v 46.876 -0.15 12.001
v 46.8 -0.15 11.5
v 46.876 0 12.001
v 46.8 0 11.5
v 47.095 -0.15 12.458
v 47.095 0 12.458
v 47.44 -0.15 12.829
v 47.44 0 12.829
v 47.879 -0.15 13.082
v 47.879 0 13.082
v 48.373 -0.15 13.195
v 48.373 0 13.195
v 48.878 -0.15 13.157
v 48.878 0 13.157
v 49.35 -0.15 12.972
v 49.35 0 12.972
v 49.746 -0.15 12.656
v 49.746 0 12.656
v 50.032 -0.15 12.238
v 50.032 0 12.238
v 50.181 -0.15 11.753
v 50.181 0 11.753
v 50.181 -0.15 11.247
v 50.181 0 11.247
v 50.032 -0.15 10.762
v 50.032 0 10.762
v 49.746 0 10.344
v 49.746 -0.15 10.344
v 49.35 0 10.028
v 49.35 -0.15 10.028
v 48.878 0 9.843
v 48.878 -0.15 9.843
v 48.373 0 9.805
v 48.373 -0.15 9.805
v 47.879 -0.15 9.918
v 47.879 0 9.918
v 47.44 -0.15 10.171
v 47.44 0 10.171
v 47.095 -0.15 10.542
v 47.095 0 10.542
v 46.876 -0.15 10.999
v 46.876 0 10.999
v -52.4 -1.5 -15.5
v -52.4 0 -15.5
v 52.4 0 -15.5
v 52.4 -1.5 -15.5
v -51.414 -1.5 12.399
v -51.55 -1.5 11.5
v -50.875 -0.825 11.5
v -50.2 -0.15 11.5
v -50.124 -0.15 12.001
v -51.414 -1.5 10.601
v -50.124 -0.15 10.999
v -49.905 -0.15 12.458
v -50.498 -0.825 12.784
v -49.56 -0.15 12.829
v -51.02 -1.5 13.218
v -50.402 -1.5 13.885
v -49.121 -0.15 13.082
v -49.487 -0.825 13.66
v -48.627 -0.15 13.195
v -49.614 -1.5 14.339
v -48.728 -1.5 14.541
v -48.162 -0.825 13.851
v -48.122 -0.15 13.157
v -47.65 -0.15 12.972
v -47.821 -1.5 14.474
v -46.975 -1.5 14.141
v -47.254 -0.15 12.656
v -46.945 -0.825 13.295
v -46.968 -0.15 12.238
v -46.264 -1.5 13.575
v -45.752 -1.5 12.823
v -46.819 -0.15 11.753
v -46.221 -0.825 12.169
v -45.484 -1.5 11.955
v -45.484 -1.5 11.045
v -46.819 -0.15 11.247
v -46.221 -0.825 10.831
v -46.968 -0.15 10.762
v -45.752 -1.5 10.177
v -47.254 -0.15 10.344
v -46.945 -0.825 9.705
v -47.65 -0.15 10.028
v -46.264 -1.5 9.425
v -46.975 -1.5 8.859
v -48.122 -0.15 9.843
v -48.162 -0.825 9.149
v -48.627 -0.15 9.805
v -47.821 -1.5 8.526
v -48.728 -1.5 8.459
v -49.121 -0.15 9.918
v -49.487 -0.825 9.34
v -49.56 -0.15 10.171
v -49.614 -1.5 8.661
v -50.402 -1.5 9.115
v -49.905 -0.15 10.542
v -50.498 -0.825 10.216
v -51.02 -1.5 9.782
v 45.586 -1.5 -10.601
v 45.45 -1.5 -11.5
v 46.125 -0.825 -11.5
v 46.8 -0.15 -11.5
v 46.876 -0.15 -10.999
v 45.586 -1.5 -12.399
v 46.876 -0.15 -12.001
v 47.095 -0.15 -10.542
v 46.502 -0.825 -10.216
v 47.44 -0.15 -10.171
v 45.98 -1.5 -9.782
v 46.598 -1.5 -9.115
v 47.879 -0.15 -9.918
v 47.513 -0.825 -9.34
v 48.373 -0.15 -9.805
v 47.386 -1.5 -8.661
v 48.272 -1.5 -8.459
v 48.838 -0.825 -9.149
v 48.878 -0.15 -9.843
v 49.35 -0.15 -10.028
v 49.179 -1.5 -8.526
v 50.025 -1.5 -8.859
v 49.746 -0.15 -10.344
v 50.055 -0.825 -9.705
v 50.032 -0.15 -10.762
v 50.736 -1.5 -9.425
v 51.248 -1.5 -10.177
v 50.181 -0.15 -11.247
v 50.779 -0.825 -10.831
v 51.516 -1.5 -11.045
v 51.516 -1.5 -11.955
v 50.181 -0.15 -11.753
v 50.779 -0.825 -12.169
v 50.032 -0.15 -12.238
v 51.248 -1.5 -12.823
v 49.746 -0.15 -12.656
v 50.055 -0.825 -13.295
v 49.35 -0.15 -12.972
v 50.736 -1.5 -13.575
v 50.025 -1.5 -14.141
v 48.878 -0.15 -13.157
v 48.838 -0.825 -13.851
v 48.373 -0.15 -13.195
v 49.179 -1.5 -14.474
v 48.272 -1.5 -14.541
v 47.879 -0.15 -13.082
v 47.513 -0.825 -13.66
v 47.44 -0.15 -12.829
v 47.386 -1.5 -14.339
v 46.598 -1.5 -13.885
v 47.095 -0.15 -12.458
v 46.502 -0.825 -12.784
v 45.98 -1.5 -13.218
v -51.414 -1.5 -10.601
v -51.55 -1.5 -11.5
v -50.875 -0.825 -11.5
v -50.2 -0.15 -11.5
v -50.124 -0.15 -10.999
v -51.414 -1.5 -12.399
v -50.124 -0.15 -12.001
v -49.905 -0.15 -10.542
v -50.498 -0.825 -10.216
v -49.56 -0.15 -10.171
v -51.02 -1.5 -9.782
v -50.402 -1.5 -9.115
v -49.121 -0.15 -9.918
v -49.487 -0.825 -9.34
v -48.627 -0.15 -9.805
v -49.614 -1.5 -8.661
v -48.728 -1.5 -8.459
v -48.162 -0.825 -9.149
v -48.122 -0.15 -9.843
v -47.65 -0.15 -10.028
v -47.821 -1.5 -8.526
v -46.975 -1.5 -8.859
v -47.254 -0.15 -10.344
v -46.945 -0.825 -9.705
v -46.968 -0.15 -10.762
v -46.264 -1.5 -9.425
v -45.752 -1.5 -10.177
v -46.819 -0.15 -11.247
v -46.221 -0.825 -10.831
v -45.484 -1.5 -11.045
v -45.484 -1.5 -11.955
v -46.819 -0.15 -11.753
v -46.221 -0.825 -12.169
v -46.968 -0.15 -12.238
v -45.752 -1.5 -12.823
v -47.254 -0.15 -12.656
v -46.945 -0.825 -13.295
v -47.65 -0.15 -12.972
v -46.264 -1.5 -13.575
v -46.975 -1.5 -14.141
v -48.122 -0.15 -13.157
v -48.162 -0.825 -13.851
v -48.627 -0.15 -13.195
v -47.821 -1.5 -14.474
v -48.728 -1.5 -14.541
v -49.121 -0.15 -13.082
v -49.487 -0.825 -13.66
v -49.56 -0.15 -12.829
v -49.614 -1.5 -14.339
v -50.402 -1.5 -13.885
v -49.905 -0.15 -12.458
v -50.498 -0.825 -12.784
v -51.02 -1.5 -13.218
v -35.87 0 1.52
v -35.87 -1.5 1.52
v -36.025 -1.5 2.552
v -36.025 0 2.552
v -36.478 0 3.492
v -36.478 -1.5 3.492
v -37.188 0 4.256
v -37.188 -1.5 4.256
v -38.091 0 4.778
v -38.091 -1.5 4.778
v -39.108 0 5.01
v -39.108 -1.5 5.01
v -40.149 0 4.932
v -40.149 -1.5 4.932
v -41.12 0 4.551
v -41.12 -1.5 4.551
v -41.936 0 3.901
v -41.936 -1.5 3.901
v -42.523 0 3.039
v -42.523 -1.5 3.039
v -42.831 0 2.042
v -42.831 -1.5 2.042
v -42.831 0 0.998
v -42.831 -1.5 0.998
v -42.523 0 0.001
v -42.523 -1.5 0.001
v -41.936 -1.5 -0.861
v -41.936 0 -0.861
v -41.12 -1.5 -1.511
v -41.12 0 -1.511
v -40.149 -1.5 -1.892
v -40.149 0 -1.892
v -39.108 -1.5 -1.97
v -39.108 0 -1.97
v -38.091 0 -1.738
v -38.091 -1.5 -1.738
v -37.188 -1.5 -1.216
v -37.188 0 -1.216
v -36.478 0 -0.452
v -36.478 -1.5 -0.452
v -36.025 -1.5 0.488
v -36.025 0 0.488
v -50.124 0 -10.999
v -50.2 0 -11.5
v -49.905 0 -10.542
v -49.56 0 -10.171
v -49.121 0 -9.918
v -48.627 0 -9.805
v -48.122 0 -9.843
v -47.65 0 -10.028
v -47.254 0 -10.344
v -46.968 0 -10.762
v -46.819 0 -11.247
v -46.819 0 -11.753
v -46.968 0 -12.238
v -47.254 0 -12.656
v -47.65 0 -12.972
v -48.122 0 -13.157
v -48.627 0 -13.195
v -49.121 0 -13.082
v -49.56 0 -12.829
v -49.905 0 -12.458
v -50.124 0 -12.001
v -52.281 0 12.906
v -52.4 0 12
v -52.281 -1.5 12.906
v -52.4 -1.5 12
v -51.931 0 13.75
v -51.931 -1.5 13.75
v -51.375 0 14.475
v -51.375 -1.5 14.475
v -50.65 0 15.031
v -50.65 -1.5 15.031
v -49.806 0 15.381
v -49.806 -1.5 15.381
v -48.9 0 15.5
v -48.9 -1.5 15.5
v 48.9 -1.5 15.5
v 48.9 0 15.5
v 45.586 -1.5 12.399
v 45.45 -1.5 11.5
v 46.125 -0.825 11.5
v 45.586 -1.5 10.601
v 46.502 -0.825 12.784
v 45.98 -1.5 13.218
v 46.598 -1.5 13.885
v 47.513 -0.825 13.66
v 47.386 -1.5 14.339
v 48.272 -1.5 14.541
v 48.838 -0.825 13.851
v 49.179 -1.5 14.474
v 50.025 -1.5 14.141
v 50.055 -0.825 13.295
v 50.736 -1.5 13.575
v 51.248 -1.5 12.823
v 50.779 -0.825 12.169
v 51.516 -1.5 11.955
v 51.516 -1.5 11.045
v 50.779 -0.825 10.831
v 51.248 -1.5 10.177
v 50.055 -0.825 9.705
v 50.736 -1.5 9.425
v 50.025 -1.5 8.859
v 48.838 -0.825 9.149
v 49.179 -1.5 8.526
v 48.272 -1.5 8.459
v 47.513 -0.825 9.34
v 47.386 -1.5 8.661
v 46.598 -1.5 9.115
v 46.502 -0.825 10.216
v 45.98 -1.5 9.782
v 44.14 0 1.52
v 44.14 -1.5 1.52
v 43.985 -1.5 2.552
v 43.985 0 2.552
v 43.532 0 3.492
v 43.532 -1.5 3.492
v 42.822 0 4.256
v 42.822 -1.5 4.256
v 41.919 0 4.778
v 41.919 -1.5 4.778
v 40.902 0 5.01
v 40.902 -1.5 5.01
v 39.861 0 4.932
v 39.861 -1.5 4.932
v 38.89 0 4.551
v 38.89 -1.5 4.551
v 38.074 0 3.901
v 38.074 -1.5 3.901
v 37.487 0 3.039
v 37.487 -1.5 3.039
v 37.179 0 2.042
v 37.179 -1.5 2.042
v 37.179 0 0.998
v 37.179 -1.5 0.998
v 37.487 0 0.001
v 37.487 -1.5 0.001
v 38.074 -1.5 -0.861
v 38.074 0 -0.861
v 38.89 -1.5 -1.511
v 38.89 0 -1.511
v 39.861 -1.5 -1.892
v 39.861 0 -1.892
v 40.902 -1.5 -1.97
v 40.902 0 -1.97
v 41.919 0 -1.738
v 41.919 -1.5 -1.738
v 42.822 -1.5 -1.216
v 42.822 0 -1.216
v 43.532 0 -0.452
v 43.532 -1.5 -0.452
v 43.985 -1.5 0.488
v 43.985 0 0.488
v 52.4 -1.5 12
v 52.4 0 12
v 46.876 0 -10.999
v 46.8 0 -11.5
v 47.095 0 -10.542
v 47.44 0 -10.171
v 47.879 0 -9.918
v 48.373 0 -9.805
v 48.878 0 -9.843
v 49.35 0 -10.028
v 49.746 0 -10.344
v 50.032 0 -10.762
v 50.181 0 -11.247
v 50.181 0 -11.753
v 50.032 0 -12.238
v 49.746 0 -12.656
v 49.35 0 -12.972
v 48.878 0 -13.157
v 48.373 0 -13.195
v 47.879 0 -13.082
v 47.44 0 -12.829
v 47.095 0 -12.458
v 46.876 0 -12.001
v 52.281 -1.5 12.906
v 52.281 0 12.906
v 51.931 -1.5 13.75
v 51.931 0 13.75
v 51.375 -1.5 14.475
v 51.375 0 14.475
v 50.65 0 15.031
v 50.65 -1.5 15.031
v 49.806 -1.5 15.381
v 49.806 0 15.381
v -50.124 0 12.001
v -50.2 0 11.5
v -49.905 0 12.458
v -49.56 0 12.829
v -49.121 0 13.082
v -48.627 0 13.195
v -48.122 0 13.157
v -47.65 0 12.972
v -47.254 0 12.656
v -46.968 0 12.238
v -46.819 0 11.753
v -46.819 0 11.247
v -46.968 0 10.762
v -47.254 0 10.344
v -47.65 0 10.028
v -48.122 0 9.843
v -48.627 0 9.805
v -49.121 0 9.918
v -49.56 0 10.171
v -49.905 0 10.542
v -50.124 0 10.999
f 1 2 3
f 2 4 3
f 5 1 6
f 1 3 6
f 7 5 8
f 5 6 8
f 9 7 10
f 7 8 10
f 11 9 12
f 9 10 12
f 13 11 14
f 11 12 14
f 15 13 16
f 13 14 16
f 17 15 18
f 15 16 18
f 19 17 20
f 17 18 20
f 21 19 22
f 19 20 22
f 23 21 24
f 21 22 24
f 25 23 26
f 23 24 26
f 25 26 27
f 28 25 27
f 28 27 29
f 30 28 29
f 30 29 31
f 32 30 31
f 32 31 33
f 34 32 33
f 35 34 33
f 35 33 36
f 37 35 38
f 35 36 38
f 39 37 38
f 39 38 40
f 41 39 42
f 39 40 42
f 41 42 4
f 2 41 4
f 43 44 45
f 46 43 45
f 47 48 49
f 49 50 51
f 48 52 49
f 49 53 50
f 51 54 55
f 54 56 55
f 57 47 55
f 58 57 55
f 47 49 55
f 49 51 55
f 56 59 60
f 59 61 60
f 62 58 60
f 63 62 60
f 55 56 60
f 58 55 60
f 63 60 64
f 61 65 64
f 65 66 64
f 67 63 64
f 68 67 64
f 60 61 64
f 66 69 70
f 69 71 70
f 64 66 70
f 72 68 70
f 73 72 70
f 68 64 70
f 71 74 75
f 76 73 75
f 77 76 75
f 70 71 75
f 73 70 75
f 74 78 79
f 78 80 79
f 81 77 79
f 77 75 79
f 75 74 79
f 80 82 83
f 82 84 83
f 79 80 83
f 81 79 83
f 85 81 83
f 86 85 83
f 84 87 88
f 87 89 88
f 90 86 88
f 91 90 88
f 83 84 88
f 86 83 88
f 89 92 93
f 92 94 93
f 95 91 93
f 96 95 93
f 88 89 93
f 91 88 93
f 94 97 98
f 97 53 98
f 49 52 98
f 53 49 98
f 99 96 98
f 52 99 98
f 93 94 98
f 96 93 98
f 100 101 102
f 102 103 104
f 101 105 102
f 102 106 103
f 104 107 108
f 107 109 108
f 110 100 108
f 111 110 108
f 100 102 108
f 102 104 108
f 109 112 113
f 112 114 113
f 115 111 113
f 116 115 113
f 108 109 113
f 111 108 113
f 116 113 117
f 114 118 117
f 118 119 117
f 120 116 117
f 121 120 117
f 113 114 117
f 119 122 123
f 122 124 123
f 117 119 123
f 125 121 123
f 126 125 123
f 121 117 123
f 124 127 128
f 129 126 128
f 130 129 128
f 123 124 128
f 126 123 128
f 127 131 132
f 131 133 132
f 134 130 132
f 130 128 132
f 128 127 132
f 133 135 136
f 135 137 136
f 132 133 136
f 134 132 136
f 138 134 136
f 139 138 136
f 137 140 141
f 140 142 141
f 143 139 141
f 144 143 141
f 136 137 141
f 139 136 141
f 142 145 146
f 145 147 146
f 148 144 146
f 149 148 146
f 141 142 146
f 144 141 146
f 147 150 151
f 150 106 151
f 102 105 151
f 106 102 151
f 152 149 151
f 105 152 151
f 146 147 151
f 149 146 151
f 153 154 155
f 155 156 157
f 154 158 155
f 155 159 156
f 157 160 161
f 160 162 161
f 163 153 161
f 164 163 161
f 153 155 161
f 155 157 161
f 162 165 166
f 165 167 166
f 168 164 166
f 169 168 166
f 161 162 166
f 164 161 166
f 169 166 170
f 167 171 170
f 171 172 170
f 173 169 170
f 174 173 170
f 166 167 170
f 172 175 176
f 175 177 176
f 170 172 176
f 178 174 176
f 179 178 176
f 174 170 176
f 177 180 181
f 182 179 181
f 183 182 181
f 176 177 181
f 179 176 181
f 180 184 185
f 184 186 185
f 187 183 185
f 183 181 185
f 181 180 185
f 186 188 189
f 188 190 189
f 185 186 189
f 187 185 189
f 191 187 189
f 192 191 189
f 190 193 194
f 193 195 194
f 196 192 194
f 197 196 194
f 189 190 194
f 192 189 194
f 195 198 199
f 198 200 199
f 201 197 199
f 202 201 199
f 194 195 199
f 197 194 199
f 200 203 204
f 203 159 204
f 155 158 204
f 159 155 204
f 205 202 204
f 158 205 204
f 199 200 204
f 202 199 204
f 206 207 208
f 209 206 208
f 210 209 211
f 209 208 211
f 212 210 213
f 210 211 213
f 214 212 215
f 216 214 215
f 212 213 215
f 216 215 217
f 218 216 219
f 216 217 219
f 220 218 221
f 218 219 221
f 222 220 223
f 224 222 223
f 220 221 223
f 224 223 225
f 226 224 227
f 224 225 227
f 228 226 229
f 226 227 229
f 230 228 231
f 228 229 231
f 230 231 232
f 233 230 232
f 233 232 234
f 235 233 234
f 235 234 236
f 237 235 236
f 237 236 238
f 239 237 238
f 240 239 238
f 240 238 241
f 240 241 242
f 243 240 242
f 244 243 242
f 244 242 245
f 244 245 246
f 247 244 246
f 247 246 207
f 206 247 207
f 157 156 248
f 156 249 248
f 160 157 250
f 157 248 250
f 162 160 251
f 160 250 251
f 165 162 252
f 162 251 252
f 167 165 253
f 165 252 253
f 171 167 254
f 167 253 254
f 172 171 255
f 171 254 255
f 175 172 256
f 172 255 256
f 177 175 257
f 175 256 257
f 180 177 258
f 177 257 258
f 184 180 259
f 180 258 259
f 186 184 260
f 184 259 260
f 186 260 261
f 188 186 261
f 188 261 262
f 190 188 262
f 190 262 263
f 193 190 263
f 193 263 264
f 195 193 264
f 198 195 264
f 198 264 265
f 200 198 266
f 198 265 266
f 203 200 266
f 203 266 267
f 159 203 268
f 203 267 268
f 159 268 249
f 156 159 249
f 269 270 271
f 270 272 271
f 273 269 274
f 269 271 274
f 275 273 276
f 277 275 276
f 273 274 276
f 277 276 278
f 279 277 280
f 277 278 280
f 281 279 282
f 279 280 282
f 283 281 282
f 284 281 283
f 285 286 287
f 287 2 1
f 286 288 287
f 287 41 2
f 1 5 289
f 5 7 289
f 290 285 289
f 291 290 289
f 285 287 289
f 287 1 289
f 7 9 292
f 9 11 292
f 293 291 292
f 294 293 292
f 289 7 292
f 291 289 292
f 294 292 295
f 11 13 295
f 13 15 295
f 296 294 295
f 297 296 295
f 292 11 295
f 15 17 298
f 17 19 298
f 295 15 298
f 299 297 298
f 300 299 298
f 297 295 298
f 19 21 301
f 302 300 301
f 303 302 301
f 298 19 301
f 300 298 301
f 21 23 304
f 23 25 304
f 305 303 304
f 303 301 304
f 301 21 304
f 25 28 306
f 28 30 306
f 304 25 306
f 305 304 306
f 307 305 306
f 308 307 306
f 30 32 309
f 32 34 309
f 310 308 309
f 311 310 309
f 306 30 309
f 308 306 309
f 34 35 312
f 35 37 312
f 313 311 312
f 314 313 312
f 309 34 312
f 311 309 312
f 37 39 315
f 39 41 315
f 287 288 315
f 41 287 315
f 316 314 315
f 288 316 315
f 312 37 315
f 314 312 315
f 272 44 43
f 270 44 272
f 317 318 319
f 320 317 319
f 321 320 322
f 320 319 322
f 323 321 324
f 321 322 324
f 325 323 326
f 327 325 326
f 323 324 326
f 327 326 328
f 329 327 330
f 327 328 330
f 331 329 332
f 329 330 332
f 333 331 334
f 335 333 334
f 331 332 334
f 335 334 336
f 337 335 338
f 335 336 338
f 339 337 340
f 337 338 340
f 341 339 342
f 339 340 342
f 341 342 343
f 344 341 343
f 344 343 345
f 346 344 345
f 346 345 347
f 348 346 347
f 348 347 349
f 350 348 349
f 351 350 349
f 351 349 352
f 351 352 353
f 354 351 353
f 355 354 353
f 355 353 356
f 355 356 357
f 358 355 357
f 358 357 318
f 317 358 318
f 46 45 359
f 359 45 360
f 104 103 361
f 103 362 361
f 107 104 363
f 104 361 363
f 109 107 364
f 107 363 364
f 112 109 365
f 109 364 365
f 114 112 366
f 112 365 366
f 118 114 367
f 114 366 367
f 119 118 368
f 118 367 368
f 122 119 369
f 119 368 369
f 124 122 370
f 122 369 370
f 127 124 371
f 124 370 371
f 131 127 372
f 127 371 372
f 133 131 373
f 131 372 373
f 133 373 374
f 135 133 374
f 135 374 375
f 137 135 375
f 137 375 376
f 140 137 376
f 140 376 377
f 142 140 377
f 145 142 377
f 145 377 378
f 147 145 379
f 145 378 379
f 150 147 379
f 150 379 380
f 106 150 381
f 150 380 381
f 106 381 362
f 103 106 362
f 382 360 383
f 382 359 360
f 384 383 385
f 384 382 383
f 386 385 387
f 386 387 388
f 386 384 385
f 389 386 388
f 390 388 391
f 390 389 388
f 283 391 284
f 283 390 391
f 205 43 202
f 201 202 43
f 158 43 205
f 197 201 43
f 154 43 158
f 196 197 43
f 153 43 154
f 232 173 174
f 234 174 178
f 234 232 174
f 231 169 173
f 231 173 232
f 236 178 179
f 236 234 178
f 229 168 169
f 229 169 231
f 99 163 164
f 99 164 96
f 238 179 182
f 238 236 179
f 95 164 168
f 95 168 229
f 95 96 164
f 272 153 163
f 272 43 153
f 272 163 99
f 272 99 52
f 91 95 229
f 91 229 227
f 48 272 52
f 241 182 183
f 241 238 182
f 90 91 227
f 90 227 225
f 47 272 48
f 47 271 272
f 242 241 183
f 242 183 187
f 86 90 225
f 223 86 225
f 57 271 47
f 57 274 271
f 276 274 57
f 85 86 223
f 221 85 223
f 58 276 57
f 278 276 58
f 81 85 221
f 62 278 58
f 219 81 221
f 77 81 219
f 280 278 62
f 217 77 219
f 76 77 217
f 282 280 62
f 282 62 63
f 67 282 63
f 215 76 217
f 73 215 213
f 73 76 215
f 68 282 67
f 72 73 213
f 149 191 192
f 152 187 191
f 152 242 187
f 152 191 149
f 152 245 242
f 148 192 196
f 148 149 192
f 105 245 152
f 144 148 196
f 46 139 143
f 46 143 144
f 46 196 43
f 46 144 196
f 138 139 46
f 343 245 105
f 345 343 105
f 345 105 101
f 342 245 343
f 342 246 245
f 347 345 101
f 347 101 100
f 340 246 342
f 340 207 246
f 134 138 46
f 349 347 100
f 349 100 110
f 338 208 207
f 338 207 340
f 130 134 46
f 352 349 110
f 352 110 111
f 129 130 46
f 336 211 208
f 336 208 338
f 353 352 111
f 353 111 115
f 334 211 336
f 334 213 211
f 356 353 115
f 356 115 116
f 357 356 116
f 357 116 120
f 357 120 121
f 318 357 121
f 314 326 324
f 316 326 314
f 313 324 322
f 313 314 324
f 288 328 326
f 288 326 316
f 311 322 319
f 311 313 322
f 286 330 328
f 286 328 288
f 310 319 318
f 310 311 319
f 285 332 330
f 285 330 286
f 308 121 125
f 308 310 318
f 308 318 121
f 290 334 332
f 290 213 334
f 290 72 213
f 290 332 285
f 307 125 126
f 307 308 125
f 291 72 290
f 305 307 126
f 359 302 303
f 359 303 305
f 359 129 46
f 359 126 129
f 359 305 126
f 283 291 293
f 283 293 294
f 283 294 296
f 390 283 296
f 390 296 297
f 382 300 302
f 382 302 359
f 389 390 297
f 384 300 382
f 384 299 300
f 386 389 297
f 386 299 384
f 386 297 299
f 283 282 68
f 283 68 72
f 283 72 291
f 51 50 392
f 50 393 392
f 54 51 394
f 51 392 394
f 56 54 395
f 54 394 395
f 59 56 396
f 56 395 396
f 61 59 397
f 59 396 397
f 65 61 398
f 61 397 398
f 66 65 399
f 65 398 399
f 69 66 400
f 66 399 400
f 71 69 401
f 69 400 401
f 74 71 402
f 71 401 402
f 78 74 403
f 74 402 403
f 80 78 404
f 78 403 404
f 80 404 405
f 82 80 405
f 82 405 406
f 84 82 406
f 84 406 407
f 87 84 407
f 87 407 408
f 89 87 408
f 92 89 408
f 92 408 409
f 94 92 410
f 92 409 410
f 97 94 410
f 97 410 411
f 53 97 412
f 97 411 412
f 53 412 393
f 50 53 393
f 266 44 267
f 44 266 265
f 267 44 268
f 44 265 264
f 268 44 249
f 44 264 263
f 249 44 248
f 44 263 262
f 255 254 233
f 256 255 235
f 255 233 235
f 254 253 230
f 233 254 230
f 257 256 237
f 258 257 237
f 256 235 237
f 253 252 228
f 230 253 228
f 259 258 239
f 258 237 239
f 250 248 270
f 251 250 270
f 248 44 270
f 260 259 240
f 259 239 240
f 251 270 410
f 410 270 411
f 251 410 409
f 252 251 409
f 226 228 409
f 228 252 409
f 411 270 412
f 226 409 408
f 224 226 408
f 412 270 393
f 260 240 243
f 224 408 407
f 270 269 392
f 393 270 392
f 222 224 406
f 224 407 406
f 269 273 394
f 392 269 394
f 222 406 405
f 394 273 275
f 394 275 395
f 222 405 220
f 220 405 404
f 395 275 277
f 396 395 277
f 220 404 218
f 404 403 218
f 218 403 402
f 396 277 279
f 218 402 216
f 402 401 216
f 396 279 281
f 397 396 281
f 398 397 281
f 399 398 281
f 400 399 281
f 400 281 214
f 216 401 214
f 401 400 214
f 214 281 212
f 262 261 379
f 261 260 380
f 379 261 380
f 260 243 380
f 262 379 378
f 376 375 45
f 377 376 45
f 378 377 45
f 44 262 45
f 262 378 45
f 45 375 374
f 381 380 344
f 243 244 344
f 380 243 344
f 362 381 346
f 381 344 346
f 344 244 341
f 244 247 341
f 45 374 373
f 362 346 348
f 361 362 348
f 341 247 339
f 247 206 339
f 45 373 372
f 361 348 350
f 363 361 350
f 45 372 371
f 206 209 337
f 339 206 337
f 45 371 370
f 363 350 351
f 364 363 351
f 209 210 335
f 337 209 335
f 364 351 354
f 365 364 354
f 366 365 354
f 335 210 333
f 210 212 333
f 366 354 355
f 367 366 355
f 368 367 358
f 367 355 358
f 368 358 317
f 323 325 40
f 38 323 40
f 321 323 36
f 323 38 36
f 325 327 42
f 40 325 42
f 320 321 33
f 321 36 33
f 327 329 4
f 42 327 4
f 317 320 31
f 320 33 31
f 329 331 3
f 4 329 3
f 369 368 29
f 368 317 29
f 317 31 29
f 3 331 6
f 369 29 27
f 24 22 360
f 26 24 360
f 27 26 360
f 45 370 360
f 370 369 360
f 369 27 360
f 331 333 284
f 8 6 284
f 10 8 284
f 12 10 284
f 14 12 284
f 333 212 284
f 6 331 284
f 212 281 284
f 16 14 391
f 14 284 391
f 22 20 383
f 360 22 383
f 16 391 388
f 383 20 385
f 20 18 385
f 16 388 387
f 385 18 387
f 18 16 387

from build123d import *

# Parameters (mm, degrees)
SKETCH_W            = 104.8
SKETCH_H            = 31
PAD_DEPTH           = 1.5
HOLE_D              = 3.4
HOLE_DEPTH          = 25
HOLE_CSINK_D        = 6.1
HOLE_CSINK_ANGLE    = 90
FILLET_R            = 3.5
SKETCH002_R         = 3.5
POCKET_DEPTH        = 1.501
LINEARPATTERN_COUNT = 2
LINEARPATTERN_PITCH = 80.01


with BuildPart() as part:
    # Sketch → Pad (new body)
    with BuildSketch(Plane.XZ):
        Rectangle(SKETCH_W, SKETCH_H)
    extrude(amount=PAD_DEPTH)

    # Hole
    with Locations(Plane.XZ.offset(1.5)):
        with Locations((-48.5, 11.5), (-48.5, -11.5), (48.5, -11.5), (48.5, 11.5)):
            CounterSinkHole(HOLE_D / 2, HOLE_CSINK_D / 2, depth=HOLE_DEPTH, counter_sink_angle=HOLE_CSINK_ANGLE)

    # Fillet
    fillet_edges = [part.edges().sort_by_distance(p)[0] for p in [
        (-52.4, -0.75, 15.5),
        (52.4, -0.75, 15.5),
    ]]
    fillet(fillet_edges, radius=FILLET_R)

    # Sketch002 (on Face5 of Fillet) → Pocket (cut, through all)
    with BuildSketch(Plane.XZ.offset(1.5)):
        with Locations((-39.37, 1.52)):
            Circle(SKETCH002_R)
    pocket = extrude(amount=-POCKET_DEPTH, mode=Mode.SUBTRACT)

    # LinearPattern: Pocket ×2
    with Locations(*[(i * LINEARPATTERN_PITCH, 0, 0) for i in range(1, LINEARPATTERN_COUNT)]):
        add(pocket, mode=Mode.SUBTRACT)


solid = part.part
